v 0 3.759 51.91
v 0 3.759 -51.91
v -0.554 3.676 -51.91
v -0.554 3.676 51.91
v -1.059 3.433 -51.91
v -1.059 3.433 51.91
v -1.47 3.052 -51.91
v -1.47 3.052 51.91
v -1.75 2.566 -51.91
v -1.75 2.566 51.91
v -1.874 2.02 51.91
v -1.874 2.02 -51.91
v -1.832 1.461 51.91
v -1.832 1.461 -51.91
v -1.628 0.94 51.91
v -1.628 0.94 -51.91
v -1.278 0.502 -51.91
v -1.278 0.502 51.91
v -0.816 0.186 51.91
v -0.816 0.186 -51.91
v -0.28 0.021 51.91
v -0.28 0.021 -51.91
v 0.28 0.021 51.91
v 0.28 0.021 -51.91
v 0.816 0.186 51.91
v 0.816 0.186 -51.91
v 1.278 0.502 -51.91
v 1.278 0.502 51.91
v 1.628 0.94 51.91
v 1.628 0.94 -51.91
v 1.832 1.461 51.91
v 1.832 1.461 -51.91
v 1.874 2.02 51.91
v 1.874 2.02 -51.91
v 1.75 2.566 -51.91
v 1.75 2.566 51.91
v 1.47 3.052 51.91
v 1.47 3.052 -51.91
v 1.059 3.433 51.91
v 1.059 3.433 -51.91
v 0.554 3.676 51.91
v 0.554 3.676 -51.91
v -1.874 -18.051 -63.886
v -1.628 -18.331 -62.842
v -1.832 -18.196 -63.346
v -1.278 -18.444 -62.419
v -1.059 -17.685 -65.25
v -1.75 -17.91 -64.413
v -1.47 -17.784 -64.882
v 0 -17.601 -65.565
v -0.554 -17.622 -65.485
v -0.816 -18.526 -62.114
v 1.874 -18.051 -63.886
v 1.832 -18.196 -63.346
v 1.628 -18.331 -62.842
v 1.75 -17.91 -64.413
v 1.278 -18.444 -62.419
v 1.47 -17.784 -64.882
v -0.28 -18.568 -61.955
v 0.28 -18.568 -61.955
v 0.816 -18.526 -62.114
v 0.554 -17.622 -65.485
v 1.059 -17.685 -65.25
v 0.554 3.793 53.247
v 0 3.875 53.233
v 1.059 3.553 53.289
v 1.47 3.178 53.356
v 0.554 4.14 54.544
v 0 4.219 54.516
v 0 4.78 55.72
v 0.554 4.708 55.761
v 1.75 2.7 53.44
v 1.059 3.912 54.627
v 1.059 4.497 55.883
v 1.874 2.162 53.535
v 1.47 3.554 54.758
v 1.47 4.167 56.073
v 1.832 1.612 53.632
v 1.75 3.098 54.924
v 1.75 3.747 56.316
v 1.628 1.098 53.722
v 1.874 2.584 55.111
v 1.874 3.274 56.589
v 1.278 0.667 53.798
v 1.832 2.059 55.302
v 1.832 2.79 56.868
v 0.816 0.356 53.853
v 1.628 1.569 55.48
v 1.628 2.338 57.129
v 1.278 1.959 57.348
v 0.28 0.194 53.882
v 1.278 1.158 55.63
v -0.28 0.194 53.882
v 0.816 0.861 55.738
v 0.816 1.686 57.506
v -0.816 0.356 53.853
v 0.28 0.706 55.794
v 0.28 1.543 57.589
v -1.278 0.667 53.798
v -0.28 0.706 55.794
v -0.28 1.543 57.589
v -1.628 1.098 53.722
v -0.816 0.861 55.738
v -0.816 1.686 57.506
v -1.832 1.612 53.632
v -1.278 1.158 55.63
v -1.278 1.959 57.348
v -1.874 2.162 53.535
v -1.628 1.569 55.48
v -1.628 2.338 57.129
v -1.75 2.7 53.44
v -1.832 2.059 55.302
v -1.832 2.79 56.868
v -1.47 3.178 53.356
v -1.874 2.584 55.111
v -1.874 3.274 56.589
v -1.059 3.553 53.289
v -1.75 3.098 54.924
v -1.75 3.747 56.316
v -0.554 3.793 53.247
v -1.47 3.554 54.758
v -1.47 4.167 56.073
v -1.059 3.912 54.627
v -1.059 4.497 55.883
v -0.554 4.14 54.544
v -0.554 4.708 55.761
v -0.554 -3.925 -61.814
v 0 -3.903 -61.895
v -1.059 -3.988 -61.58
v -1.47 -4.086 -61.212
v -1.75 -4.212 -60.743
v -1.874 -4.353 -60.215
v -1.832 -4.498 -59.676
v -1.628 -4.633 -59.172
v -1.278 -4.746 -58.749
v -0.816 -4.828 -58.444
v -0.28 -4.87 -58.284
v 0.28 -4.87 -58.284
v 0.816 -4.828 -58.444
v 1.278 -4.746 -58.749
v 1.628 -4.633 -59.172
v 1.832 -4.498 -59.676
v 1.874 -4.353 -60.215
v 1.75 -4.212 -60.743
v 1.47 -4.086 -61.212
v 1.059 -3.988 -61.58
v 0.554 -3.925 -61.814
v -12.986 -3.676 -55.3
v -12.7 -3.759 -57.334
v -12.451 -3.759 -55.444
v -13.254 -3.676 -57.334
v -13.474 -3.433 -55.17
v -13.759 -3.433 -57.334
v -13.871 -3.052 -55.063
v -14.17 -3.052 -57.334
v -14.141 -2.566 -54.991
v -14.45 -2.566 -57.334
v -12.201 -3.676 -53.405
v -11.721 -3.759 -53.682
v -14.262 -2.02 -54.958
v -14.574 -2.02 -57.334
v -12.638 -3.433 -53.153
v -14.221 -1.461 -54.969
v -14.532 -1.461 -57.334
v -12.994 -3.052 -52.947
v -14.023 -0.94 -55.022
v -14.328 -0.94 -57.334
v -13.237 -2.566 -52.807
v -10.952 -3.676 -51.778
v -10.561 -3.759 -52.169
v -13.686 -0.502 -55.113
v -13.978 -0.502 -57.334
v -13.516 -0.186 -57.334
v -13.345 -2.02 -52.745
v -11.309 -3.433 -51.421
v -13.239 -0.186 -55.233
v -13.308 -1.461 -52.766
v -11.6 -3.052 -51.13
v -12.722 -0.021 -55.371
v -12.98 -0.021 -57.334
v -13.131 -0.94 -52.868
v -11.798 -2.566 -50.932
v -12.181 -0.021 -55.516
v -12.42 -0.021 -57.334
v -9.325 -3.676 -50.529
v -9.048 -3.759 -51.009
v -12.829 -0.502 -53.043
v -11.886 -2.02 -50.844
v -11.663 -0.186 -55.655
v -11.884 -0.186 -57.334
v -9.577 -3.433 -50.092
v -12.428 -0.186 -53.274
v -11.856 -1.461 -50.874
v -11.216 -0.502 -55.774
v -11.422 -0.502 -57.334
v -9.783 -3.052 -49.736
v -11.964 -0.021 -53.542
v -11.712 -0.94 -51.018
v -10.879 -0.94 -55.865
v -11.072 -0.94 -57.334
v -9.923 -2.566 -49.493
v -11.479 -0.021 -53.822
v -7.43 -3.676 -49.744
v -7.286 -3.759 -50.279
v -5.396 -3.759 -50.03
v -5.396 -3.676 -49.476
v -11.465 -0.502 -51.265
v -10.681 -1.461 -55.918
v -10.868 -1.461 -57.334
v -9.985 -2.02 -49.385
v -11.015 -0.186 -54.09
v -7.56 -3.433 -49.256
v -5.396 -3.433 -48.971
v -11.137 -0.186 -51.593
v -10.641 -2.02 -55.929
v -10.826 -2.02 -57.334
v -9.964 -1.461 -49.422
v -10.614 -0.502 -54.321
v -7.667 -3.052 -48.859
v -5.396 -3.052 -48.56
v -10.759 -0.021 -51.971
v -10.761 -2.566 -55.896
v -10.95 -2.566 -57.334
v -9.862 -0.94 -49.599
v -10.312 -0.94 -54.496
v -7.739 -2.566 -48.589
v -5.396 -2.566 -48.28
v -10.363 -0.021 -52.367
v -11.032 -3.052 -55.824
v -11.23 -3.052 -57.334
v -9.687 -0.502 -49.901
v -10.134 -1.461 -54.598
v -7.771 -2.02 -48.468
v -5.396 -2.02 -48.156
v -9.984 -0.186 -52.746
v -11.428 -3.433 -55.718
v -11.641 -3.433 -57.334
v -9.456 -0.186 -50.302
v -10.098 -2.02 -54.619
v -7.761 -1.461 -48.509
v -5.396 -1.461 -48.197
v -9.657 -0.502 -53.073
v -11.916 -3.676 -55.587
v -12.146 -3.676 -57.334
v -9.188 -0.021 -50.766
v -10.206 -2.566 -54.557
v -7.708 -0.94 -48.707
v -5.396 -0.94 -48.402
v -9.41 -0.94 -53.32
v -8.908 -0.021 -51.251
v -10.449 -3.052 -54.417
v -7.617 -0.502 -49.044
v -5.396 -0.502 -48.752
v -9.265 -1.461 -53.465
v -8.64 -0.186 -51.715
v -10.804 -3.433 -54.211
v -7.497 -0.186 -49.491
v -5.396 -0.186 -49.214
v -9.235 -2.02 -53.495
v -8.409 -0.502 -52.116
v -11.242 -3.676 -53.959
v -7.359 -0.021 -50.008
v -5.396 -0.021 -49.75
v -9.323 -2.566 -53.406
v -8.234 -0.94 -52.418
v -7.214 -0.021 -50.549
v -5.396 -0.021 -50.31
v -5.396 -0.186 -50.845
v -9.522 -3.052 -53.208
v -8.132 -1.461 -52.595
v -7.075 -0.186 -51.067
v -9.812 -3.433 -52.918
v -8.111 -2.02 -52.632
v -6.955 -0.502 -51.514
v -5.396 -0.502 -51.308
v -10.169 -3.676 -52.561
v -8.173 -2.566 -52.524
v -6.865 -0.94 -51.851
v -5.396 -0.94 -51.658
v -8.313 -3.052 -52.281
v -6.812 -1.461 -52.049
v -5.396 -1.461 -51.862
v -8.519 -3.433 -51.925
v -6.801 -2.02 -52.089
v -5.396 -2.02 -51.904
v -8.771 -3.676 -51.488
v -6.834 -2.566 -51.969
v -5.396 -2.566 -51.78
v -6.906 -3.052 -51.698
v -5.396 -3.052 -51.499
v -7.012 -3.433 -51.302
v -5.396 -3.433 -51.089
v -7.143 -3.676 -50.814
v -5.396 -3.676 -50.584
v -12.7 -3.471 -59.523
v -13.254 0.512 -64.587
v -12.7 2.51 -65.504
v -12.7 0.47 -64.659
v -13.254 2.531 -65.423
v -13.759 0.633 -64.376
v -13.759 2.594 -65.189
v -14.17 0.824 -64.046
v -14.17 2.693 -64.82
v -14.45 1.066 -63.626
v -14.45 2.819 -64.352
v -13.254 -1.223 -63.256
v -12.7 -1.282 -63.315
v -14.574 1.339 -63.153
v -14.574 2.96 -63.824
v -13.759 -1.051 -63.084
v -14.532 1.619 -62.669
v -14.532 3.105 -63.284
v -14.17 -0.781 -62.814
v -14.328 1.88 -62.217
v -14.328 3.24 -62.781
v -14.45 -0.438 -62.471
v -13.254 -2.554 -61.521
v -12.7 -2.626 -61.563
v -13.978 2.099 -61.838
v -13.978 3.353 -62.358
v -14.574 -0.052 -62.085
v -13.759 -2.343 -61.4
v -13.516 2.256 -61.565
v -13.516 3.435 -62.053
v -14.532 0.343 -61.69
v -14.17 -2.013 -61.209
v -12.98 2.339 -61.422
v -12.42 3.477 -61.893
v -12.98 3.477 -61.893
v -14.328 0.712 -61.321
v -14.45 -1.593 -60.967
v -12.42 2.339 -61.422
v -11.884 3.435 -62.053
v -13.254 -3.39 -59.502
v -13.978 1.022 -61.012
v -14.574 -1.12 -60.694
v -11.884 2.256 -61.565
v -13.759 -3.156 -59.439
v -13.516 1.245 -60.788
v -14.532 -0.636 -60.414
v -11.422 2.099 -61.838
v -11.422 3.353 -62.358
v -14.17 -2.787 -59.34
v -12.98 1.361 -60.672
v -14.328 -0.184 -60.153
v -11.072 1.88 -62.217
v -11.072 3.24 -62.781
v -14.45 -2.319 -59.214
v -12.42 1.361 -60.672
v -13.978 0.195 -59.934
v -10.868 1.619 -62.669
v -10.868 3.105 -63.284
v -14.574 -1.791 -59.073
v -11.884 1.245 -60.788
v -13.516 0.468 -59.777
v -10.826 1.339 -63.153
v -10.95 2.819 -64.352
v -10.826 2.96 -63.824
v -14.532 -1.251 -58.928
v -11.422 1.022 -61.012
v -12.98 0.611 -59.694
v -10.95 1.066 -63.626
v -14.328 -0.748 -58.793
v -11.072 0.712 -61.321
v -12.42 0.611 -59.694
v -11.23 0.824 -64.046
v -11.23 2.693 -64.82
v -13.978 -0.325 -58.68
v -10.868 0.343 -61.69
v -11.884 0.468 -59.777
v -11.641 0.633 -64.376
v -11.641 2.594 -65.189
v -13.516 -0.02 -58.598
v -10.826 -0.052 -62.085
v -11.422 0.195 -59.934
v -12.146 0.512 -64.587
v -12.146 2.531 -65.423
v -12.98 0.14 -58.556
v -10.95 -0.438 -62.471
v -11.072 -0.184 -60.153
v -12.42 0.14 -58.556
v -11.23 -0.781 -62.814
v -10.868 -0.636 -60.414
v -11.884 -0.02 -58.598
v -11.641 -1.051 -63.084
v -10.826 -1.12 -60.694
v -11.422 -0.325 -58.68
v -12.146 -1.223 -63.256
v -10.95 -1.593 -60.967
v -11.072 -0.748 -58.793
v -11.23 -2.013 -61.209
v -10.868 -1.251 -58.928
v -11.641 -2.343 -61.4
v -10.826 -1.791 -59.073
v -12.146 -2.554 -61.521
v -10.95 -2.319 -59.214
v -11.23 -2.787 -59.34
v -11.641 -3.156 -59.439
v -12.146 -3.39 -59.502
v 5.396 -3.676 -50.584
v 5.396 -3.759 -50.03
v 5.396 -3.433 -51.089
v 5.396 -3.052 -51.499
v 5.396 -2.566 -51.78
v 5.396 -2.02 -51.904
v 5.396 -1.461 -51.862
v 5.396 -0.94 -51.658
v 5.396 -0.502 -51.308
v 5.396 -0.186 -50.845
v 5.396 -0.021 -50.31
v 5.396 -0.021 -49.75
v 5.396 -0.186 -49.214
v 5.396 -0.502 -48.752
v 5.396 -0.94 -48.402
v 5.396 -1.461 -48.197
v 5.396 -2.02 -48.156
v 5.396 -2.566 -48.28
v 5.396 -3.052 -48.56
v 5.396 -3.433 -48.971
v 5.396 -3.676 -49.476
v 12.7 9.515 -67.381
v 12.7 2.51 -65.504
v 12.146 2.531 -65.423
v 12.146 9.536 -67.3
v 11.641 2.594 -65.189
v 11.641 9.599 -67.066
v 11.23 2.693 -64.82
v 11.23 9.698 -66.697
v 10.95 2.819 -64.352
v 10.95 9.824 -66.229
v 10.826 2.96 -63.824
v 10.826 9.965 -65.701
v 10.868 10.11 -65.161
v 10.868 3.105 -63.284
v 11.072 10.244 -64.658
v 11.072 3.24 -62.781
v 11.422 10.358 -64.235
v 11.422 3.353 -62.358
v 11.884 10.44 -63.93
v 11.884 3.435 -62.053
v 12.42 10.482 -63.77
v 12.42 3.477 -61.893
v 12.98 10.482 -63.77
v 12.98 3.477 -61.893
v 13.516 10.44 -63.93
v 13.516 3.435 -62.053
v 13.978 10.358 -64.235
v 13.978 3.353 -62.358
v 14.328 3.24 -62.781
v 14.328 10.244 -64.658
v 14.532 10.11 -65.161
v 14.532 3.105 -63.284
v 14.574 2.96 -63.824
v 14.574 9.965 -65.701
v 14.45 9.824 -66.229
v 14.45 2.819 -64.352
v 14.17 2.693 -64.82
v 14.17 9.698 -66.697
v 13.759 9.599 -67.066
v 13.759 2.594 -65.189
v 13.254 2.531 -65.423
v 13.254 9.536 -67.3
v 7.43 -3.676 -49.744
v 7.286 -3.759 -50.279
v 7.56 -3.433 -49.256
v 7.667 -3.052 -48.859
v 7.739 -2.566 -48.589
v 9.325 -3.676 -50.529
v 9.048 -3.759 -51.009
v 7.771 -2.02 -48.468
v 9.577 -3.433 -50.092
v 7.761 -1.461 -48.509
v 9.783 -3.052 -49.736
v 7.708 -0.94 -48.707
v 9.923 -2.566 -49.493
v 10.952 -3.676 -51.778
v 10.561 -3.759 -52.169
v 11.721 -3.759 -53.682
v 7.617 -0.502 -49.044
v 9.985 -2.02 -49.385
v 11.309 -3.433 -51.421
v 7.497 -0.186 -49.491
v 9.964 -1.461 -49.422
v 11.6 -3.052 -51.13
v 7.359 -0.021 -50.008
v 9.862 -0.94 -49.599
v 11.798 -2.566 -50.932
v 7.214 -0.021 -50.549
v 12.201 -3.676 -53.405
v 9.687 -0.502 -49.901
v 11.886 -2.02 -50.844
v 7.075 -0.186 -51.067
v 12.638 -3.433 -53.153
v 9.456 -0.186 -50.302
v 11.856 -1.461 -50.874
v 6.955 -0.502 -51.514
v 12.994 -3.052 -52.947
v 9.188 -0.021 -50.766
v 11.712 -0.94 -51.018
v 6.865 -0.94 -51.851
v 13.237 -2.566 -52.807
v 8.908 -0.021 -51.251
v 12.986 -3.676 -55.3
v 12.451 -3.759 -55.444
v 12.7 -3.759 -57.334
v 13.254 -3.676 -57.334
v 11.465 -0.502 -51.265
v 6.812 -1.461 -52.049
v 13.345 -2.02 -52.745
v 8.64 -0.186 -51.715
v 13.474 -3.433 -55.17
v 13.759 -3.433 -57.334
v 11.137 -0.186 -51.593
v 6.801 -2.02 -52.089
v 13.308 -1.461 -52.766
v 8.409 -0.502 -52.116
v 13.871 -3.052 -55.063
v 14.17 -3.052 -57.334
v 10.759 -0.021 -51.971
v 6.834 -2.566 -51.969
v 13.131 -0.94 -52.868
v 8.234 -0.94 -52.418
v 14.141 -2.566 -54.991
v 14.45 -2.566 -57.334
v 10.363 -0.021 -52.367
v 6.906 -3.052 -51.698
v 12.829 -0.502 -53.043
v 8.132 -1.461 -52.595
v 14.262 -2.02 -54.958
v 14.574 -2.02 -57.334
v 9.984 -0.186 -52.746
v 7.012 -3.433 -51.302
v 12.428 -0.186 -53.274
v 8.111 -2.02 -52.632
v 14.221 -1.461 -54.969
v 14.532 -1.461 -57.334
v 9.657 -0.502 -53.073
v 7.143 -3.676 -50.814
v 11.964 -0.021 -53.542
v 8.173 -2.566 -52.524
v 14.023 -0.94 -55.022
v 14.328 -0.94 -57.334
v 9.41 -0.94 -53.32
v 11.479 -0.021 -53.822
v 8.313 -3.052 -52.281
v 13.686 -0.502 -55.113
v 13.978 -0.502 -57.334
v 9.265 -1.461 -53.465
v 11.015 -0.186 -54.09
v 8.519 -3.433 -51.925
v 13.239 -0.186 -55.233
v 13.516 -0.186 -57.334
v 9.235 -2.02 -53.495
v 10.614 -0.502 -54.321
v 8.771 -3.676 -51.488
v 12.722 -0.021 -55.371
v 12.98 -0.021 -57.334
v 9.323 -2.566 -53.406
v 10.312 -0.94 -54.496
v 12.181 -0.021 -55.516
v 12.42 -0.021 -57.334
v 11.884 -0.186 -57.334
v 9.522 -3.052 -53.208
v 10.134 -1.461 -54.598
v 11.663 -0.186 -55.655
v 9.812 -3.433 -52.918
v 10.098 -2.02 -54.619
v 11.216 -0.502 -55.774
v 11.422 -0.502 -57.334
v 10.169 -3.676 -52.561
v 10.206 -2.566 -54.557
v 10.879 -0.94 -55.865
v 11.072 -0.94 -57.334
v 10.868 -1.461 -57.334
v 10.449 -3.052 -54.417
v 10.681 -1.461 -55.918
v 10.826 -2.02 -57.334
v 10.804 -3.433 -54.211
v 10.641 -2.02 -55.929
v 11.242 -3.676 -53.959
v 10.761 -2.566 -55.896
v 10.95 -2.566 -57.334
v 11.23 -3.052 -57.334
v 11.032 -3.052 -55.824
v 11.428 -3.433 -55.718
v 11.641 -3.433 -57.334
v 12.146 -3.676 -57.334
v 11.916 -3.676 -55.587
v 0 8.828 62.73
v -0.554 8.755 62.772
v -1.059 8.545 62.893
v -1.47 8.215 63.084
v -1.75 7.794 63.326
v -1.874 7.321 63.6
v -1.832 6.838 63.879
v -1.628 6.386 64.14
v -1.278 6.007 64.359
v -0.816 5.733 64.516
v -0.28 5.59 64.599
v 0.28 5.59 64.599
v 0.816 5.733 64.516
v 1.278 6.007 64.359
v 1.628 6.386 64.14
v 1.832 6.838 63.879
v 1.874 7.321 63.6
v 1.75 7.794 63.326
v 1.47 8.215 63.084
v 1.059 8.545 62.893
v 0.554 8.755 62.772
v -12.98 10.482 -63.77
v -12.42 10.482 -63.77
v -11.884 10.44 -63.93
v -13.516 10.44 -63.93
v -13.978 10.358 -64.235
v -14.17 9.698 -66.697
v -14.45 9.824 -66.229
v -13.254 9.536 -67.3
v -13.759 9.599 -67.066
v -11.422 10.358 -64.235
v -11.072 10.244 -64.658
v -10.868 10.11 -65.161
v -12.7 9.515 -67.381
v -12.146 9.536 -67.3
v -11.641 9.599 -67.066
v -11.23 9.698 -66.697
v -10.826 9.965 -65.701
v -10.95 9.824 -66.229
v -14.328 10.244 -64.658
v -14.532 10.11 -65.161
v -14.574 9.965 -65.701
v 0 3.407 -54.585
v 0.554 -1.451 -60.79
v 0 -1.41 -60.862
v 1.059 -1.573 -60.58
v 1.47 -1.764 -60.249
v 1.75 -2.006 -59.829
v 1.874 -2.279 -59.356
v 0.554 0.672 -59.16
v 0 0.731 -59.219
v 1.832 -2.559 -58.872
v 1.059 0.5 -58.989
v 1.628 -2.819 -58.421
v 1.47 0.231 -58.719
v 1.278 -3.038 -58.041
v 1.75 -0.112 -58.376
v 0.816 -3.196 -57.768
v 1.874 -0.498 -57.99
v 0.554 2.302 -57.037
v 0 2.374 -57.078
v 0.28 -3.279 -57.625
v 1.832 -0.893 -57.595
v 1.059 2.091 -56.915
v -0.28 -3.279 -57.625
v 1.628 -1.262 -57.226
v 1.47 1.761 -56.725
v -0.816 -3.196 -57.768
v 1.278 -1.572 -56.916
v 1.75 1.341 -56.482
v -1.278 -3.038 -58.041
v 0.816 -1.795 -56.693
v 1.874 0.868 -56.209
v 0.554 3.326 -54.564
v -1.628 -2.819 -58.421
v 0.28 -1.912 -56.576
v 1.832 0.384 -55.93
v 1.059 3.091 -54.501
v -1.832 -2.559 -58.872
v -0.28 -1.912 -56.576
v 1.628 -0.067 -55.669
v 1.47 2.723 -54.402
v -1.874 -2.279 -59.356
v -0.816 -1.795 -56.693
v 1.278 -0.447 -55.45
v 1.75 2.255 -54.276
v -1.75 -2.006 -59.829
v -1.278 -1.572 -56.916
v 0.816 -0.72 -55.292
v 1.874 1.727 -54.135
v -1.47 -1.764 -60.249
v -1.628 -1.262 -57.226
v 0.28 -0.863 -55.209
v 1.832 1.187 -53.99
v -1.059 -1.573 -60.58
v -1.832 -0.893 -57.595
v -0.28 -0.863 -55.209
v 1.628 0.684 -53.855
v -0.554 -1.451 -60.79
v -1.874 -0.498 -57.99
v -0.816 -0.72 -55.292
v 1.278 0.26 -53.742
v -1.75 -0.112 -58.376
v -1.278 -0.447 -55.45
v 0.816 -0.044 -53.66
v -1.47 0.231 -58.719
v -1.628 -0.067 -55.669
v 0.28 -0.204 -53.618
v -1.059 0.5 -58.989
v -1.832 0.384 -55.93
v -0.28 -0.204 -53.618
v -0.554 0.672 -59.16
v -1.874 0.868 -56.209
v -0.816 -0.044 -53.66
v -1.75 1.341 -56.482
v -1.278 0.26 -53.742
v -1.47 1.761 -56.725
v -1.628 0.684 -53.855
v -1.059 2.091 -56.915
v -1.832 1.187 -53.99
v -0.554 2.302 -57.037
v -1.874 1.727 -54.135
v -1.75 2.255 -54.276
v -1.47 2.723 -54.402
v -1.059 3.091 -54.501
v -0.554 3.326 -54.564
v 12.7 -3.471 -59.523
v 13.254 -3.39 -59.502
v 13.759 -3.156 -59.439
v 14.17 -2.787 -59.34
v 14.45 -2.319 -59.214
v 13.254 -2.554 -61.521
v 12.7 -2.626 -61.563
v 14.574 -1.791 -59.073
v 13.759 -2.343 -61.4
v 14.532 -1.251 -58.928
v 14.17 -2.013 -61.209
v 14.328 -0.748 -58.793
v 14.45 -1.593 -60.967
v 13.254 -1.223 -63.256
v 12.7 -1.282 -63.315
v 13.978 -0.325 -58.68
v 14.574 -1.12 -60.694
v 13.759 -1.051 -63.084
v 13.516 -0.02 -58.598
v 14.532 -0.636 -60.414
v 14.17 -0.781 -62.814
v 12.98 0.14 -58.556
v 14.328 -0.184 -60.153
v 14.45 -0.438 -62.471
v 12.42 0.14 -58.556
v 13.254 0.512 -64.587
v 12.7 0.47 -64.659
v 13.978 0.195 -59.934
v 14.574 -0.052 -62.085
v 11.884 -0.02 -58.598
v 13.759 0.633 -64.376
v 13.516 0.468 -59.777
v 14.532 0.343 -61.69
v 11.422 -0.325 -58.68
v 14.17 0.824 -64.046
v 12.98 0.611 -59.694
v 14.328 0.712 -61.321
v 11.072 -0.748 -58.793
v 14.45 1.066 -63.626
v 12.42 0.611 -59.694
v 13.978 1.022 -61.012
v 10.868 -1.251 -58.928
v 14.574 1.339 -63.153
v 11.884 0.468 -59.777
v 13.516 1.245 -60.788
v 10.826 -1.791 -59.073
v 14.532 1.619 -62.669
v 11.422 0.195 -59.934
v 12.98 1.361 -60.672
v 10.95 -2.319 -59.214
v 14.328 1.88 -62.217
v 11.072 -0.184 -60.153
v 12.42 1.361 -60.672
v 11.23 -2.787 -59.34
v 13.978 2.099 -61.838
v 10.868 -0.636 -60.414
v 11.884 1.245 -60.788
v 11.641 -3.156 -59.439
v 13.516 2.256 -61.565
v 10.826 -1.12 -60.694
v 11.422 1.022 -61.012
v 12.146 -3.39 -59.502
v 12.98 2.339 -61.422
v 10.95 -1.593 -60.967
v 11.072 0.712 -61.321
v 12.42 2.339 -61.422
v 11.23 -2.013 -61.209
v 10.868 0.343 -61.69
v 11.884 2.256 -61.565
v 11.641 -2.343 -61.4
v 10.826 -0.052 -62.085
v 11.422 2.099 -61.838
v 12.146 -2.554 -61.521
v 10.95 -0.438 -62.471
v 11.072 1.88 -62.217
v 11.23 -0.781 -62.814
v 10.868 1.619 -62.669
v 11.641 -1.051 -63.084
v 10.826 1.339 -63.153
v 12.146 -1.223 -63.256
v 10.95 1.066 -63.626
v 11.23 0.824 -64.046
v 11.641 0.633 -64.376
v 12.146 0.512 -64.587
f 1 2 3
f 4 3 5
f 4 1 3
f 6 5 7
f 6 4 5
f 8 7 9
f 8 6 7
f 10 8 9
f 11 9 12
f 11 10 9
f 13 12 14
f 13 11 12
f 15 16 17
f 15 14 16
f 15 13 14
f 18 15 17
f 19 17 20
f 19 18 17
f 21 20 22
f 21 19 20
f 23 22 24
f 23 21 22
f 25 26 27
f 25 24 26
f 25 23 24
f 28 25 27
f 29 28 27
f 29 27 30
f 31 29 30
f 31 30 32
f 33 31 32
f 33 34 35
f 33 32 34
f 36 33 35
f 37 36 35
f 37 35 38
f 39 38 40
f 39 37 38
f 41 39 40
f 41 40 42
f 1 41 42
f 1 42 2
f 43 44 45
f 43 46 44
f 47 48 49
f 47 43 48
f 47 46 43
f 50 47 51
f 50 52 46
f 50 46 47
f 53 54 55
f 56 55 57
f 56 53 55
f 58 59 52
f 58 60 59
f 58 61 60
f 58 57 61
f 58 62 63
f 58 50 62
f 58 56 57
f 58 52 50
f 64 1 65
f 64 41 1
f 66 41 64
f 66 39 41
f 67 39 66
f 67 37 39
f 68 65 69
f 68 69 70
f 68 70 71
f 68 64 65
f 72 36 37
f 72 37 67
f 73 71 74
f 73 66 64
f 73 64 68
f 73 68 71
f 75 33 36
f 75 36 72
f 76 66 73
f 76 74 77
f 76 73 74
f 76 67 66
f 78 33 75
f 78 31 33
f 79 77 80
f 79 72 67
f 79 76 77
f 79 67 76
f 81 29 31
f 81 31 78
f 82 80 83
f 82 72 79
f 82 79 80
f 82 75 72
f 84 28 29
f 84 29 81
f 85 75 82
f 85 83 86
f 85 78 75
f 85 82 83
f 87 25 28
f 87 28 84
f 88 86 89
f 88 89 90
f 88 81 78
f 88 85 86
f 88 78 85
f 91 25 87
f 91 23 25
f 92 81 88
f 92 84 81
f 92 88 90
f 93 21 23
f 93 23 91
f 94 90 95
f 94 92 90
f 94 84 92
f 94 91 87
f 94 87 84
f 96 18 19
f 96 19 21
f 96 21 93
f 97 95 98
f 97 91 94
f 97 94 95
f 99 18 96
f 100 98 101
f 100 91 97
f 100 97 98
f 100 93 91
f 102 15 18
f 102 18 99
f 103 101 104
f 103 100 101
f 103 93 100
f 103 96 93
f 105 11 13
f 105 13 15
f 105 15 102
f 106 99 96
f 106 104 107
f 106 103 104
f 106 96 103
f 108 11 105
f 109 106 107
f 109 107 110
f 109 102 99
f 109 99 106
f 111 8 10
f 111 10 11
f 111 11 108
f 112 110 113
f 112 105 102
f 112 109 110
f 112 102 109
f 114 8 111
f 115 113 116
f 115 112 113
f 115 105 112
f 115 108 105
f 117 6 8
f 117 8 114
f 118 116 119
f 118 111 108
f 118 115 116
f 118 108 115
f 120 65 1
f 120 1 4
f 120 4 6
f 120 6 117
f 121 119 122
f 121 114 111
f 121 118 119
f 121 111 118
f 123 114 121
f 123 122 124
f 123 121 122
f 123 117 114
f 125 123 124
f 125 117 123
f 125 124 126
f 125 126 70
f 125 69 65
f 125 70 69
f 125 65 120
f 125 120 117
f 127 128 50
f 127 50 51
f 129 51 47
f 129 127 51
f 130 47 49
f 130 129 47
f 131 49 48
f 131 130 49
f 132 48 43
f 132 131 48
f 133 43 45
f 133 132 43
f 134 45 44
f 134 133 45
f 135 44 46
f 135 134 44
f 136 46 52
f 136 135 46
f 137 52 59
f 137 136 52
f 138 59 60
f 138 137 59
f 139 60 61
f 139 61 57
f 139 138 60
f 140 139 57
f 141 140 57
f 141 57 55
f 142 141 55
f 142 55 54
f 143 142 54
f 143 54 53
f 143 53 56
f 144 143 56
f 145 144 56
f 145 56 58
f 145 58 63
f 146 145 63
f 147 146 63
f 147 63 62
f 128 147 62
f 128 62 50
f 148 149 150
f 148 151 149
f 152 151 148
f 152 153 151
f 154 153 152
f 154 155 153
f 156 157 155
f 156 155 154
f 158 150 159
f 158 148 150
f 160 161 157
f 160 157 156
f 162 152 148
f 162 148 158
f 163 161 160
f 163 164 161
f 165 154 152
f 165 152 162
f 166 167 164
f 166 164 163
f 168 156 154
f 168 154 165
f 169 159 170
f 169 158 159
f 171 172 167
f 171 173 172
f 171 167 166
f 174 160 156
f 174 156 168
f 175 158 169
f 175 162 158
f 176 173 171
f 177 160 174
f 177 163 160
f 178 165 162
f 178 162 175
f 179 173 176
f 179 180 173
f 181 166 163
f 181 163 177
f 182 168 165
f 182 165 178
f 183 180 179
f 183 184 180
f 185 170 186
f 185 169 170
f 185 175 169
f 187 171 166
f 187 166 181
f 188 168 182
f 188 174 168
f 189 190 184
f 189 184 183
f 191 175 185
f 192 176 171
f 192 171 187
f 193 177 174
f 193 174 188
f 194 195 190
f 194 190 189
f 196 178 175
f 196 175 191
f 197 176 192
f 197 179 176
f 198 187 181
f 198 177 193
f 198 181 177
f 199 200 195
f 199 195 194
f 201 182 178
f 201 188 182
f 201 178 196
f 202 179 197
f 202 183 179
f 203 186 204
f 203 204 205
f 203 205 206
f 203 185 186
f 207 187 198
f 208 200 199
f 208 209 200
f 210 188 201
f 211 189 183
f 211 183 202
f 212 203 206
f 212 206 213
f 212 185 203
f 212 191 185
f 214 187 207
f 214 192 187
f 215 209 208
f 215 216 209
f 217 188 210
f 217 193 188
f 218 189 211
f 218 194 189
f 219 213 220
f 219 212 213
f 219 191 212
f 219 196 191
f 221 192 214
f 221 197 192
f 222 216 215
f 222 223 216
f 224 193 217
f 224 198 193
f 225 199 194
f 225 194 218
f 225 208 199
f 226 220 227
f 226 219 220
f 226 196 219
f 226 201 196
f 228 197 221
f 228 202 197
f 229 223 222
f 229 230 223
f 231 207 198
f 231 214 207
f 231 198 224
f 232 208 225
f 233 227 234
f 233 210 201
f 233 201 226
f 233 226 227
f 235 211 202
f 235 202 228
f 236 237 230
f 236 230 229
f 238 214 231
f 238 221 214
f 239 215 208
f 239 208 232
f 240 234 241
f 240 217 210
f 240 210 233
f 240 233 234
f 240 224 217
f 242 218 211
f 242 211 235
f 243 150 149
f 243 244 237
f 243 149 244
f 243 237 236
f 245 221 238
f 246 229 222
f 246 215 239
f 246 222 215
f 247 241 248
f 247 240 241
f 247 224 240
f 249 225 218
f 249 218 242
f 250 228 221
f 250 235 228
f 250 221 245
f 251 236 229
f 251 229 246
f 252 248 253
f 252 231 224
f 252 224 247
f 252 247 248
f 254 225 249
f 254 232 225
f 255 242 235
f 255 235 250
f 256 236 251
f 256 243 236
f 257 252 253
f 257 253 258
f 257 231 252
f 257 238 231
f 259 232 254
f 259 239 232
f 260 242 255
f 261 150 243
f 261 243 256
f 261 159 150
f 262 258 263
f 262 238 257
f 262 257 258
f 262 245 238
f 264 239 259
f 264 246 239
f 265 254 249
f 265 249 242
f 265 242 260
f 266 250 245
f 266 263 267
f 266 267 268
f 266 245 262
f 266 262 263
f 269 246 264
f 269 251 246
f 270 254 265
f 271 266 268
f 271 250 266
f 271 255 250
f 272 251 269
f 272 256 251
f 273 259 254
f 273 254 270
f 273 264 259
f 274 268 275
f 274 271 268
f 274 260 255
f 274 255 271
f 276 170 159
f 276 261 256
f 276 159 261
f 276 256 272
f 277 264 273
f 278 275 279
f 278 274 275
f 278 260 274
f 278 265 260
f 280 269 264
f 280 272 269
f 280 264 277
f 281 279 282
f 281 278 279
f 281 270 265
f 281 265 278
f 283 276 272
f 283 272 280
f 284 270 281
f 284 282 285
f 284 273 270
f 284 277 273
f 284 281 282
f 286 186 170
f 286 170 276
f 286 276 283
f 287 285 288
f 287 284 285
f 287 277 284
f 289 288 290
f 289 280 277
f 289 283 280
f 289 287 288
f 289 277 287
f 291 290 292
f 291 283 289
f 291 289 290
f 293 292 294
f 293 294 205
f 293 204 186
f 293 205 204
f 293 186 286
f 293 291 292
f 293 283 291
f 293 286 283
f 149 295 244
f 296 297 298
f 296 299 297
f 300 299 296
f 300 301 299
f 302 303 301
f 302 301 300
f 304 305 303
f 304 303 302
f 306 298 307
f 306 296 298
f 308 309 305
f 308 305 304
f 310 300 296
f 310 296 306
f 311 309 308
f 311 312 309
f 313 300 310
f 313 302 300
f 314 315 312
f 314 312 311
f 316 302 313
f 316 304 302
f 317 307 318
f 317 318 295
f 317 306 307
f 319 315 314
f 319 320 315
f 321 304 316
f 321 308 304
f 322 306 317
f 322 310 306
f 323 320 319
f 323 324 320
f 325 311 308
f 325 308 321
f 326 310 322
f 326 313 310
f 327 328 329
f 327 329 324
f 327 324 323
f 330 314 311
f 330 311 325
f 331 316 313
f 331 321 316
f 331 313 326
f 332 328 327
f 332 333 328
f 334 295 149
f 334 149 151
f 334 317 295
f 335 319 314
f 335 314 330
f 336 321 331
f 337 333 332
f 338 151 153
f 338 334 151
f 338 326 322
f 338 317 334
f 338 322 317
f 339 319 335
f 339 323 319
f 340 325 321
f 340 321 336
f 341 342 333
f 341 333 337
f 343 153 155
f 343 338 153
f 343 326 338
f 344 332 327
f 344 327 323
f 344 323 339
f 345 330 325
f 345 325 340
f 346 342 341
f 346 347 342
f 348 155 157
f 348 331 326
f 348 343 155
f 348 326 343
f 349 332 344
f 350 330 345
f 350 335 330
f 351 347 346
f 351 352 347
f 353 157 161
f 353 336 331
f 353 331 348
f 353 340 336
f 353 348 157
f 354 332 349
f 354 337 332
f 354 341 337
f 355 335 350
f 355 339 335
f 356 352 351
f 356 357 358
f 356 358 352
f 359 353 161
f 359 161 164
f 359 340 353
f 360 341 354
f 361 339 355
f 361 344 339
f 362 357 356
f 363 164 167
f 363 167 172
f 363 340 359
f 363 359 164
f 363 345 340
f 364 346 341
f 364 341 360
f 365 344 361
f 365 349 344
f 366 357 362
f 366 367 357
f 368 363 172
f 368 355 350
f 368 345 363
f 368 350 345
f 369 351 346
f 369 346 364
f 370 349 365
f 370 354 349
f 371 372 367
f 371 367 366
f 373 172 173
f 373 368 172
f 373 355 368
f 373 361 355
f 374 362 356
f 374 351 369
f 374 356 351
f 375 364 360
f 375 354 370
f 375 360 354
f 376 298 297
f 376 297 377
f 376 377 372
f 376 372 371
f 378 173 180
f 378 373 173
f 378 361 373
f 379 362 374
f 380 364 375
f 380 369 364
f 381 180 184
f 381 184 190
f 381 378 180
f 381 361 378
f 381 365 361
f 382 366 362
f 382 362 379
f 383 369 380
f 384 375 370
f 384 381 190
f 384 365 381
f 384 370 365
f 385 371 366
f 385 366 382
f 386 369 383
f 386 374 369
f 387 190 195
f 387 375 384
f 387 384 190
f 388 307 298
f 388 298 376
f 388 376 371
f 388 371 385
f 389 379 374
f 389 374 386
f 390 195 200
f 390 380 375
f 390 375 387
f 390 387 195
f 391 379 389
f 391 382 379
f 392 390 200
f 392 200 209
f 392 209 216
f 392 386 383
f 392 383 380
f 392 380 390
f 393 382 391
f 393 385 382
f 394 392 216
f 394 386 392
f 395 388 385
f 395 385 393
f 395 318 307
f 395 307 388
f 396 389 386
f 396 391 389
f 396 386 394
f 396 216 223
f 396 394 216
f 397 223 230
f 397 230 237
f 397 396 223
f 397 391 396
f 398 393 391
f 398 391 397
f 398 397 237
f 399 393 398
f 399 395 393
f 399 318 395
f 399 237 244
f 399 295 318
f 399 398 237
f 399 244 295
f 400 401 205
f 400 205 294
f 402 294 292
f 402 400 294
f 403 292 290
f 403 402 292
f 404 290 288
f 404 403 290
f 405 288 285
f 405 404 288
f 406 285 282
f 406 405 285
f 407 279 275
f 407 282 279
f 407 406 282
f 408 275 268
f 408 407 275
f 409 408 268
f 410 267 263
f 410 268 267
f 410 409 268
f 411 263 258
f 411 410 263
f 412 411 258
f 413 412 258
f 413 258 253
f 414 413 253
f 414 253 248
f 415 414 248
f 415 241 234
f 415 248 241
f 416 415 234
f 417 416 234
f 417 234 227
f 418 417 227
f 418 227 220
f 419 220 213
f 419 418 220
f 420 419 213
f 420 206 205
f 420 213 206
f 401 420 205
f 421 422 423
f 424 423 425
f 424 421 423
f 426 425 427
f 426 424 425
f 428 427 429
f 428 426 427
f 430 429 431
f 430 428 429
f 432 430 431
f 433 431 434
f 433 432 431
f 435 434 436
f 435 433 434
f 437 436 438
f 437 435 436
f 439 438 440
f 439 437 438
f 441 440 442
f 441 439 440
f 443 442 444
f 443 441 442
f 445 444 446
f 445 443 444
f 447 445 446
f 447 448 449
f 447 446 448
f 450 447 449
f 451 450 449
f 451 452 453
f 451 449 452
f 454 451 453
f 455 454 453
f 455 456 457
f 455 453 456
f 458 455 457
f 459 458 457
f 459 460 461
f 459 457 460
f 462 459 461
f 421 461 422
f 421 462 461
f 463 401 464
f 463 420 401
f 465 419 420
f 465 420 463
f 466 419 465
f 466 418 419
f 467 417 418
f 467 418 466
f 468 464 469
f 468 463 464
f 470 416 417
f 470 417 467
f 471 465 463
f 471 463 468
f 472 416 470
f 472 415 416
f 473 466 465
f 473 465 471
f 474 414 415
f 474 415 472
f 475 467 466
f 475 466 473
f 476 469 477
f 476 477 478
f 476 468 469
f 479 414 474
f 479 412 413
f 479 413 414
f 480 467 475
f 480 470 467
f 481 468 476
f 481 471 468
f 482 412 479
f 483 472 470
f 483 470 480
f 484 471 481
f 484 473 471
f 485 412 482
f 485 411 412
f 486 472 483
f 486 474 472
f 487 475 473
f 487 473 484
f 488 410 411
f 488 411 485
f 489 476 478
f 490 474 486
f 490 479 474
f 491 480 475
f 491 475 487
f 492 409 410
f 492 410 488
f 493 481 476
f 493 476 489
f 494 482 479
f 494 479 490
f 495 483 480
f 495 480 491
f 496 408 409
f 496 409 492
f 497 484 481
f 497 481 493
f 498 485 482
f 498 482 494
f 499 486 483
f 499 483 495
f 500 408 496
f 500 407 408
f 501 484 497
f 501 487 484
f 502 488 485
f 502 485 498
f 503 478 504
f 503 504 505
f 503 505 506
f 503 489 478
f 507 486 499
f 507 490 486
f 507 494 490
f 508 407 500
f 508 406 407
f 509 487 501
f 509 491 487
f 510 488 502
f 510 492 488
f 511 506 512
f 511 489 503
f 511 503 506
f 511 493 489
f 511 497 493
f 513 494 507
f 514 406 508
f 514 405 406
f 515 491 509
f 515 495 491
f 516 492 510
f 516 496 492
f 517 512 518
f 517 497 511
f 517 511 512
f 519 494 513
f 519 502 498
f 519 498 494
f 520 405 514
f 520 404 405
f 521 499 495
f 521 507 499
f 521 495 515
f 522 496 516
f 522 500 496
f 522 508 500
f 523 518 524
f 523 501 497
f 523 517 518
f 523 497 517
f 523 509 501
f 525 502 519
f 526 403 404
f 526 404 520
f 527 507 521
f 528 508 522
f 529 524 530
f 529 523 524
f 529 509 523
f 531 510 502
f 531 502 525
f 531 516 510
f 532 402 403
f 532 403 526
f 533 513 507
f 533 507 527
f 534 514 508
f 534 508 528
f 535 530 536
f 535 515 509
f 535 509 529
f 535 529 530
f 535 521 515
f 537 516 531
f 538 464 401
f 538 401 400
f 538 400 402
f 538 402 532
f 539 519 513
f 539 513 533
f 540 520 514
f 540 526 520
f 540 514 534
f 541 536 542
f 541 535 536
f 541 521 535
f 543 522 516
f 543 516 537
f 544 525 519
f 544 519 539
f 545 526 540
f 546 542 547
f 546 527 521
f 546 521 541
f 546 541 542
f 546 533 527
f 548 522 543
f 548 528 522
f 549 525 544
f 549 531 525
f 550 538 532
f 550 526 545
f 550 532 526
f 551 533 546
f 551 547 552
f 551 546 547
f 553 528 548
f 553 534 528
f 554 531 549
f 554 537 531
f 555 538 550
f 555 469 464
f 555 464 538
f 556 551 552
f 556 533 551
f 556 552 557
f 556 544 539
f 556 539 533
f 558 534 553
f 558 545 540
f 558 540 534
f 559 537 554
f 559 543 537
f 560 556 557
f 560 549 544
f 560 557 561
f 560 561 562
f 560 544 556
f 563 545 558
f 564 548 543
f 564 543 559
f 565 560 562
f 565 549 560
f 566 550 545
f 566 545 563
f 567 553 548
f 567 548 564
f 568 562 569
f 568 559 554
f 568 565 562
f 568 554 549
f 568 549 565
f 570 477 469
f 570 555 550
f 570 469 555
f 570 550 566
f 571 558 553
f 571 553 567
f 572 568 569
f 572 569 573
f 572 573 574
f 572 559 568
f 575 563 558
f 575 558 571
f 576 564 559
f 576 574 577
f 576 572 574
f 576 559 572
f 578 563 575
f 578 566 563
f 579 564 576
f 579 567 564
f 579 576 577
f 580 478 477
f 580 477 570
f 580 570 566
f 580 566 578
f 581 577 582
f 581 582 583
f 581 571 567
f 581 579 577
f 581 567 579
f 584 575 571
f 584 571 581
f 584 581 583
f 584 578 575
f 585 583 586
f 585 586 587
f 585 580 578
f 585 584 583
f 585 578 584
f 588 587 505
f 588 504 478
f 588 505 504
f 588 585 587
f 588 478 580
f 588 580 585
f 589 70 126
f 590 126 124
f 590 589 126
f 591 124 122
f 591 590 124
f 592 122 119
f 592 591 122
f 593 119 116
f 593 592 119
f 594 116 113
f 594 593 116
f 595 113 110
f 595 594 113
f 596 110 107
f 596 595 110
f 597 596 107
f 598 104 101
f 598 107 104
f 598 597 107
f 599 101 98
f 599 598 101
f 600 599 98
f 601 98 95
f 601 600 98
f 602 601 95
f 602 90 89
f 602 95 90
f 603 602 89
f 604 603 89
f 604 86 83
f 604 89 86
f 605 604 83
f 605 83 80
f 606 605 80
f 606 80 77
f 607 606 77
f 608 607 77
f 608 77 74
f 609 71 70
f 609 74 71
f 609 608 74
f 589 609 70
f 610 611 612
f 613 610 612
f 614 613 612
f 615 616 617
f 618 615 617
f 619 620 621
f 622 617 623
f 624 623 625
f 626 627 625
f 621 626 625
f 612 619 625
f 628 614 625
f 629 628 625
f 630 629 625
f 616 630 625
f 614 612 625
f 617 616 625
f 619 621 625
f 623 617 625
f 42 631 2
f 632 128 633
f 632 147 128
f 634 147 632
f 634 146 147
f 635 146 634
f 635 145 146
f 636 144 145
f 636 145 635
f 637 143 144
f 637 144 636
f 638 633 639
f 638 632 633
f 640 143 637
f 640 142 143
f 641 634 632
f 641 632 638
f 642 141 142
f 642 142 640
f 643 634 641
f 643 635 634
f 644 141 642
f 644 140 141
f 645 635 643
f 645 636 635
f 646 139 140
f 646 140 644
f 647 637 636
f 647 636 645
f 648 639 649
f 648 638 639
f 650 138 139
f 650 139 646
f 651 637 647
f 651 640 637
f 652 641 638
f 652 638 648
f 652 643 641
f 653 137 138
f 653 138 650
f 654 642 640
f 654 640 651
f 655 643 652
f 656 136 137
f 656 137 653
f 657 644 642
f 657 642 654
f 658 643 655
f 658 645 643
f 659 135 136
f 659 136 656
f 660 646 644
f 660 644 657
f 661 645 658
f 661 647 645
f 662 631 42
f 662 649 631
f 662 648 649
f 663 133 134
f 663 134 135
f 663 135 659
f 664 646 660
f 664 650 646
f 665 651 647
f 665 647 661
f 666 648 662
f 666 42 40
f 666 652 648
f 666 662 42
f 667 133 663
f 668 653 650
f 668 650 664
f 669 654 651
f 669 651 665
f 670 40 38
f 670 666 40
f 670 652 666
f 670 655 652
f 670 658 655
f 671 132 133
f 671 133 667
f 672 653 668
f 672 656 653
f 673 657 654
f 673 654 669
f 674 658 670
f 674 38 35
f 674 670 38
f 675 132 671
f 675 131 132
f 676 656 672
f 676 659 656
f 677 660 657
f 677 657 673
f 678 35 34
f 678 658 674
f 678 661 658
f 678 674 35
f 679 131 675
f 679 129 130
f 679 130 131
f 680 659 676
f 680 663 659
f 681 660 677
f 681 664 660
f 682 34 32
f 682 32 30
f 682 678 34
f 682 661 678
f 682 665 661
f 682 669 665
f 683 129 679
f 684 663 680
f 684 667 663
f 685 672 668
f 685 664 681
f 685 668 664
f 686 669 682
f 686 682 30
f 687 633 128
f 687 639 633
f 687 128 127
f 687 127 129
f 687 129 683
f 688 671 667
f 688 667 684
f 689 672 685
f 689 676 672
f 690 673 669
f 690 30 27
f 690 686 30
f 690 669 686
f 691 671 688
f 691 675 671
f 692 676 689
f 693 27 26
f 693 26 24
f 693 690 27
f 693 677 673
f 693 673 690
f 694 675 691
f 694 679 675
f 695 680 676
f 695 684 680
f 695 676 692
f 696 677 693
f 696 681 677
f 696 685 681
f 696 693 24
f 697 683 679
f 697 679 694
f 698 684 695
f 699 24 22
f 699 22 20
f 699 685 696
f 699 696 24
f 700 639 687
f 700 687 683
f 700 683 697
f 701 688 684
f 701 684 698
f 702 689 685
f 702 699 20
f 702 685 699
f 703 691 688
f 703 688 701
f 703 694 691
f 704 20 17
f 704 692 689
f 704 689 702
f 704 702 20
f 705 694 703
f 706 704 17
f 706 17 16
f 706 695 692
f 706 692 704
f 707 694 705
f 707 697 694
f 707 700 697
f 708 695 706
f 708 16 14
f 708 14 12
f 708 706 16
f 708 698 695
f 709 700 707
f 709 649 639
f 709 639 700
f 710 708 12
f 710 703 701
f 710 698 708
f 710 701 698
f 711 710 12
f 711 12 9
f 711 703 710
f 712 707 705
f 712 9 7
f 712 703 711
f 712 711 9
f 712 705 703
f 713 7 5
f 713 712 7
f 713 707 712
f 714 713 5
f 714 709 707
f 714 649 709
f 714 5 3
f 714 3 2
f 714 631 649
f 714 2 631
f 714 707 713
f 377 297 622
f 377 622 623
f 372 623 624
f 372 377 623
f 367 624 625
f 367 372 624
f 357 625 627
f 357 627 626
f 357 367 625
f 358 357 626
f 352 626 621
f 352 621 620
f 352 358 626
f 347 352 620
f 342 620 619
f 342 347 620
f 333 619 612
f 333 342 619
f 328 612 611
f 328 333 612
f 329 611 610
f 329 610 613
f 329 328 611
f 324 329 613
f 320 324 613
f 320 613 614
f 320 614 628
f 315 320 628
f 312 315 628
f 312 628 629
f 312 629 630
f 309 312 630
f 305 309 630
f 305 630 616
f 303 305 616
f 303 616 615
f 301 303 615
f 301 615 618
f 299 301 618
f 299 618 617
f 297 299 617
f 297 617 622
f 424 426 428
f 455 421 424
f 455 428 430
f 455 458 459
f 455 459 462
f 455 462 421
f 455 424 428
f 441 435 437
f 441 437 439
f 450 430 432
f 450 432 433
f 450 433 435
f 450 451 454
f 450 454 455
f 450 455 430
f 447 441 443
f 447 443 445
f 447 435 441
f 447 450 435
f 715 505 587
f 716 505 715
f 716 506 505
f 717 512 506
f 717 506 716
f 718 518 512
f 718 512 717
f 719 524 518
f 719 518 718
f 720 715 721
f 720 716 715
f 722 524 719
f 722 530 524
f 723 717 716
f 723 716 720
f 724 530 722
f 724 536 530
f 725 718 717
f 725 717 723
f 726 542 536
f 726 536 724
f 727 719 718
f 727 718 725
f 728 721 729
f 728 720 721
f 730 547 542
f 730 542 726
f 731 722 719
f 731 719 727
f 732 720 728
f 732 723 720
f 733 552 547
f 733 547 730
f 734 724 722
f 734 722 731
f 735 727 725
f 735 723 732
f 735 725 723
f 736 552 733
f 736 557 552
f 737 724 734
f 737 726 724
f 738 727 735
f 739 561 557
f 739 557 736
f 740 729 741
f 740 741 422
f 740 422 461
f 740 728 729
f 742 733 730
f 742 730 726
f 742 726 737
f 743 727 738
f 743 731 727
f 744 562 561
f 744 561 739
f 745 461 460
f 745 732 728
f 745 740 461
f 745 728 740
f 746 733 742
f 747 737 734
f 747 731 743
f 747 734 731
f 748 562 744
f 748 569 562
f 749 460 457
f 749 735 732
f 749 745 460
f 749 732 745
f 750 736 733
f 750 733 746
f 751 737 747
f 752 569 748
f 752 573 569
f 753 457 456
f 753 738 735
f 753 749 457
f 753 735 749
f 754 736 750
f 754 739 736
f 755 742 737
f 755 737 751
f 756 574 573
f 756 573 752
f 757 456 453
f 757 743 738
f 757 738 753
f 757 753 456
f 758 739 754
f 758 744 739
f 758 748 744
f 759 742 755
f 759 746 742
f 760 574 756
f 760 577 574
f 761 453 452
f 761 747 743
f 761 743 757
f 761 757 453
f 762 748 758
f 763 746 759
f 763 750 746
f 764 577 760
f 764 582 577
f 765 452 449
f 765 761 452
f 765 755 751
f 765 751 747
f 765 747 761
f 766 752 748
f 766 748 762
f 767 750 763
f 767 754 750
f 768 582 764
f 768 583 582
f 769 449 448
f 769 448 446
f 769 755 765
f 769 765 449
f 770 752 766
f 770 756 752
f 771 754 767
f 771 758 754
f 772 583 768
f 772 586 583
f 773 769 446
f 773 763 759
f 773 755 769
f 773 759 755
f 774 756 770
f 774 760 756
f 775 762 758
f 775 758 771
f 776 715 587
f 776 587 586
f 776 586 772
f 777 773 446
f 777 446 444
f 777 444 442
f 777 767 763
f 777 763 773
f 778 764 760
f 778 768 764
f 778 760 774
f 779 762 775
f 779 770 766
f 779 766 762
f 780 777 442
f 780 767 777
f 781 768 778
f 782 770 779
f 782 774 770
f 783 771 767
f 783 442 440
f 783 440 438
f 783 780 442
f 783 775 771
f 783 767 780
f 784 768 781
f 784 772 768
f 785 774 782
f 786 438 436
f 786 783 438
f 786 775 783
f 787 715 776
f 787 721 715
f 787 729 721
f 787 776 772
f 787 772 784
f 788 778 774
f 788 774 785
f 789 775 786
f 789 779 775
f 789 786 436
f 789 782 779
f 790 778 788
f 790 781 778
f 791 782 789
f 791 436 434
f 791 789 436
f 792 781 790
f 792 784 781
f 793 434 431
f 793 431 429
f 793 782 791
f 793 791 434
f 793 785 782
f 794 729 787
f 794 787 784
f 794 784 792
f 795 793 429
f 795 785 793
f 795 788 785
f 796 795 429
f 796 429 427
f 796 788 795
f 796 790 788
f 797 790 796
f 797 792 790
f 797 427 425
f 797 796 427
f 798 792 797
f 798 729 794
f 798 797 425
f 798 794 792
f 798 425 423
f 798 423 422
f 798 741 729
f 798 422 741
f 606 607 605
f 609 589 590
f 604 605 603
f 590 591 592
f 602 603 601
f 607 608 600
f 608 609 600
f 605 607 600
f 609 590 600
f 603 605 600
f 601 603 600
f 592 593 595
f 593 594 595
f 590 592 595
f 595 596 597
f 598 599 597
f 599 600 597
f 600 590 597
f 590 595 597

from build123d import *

# Parameters (mm, degrees)
SKETCH11_R       = 1.8796
SWEEP2_PROFILE_R = 1.8796


with BuildPart() as part:
    # Sweep1: sweep along a path in Sketch3
    with BuildLine(Plane(origin=(0, 0, 0), x_dir=(0, 0, -1), z_dir=(1, 0, 0))) as sweep1_path:
        Line((61.934325135, -18.57375), (58.26400614, -4.87593303))
        ThreePointArc((58.26400614, -4.87593303), (55.914364436, -1.359445716), (51.909566499, 0))
        Line((51.909566499, 0), (-51.909566499, 0))
        ThreePointArc((-51.909566499, 0), (-54.854720177, 0.387736837), (-57.599166499, 1.524523725))
        Line((-57.599166499, 1.524523725), (-64.609566499, 5.571980052))
    # Sketch11 → Sweep1 (sweep)
    with BuildSketch(Plane(origin=(0, -32.813125956, -8.792250601), x_dir=(0, 0.25881904510251613, -0.9659258262890696), z_dir=(0, -0.9659258262890696, -0.25881904510251613))):
        with Locations((56.896323943, 0)):
            Circle(SKETCH11_R)
    sweep(path=sweep1_path.line)


with BuildPart() as body_2:
    # Sweep2: sweep along a curve in space
    with BuildLine() as sweep2_path:
        Line((-12.7, 10.00125, -65.565433501), (-12.7, 2.99633303, -63.688471656))
        ThreePointArc((-12.7, 2.99633303, -63.688471656), (-12.7, -0.520154284, -61.338829952), (-12.7, -1.8796, -57.334032015))
        ThreePointArc((-12.7, -1.8796, -57.334032015), (-10.560688741, -1.8796, -52.169277758), (-5.395934484, -1.8796, -50.029966499))
        Line((-5.395934484, -1.8796, -50.029966499), (5.395934484, -1.8796, -50.029966499))
        ThreePointArc((5.395934484, -1.8796, -50.029966499), (10.560688741, -1.8796, -52.169277758), (12.7, -1.8796, -57.334032015))
        ThreePointArc((12.7, -1.8796, -57.334032015), (12.7, -0.520154284, -61.338829952), (12.7, 2.99633303, -63.688471656))
        Line((12.7, 2.99633303, -63.688471656), (12.7, 10.00125, -65.565433501))
    # Sweep2 profile (on start of the path) → Sweep2 (sweep)
    with BuildSketch(Plane(origin=(-12.7, 10.00125, -65.565433501), x_dir=(0, -0.25881904510251724, -0.9659258262890693), z_dir=(0, -0.9659258262890693, 0.25881904510251724))):
        Circle(SWEEP2_PROFILE_R)
    sweep(path=sweep2_path.line)


solid = Compound([part.part, body_2.part])
